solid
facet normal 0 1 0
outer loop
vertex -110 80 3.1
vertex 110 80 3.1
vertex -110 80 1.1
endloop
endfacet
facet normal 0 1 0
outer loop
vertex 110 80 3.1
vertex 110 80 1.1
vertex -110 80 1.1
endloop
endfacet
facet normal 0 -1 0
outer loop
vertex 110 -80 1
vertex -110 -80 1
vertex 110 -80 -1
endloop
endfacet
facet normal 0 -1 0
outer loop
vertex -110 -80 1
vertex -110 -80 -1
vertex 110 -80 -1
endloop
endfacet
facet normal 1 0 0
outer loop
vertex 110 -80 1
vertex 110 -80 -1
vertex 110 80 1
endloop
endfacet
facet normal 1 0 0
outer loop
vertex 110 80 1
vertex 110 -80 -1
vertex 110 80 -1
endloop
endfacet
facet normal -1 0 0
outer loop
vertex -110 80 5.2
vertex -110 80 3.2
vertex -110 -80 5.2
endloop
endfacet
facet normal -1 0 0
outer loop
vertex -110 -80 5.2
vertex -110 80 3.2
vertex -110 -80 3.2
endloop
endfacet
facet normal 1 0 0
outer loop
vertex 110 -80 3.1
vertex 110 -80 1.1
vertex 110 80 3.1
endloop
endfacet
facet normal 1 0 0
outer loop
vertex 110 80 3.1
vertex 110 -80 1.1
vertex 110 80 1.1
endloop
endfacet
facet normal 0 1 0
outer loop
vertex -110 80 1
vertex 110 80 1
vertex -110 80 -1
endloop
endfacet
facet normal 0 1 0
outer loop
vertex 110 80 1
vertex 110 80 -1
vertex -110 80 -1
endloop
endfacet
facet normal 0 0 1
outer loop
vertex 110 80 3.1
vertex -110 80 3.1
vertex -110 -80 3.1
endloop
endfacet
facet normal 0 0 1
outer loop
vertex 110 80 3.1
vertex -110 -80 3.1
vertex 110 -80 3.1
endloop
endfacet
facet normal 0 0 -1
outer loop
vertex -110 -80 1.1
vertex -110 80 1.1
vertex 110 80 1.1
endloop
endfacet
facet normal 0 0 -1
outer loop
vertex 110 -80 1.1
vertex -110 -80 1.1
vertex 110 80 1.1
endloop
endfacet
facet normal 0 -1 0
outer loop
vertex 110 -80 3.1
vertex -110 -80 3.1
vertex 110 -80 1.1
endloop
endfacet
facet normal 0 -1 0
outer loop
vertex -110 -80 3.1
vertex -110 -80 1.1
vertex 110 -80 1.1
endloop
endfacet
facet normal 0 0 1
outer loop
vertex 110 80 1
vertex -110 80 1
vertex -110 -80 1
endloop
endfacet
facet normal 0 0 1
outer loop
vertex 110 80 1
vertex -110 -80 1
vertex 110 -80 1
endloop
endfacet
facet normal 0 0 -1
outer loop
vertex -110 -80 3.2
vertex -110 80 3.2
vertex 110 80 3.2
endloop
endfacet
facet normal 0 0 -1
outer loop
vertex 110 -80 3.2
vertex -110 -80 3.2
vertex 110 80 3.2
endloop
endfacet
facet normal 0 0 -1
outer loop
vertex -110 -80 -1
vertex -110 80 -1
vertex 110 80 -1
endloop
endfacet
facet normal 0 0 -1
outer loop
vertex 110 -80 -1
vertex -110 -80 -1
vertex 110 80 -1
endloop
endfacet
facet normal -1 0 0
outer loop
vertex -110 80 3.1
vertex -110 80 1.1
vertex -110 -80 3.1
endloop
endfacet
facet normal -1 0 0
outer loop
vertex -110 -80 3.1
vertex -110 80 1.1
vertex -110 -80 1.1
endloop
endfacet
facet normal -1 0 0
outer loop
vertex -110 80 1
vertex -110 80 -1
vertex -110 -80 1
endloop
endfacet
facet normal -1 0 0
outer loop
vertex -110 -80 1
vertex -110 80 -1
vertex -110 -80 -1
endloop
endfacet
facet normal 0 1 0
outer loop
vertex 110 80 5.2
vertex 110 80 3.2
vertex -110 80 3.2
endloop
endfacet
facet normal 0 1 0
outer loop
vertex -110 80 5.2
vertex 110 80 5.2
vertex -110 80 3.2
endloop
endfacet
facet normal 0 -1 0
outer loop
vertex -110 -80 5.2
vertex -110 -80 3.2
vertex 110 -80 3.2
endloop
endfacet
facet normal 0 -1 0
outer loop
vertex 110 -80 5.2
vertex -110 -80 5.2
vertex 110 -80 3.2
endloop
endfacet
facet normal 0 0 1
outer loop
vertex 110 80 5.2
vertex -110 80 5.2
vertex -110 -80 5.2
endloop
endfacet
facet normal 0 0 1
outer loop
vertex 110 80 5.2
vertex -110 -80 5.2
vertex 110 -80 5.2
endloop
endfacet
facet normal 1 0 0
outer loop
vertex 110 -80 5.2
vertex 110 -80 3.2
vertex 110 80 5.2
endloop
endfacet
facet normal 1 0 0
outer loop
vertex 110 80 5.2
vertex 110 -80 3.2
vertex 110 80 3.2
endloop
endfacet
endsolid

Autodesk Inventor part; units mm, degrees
ref_plane "YZ Plane" through (0, 0, 0) normal (1, 0, 0) x (0, 1, 0)
ref_plane "XZ Plane" through (0, 0, 0) normal (0, 1, 0) x (-1, 0, 0)
ref_plane "XY Plane" through (0, 0, 0) normal (0, 0, 1) x (1, 0, 0)
sketch "Sketch1" plane through (0, 0, 0) normal (0, 0, 1) x (1, 0, 0)
  line L0 (-110, -80) -> (110, -80)
  line L1 (110, -80) -> (110, 80)
  line L2 (110, 80) -> (-110, 80)
  line L3 (-110, 80) -> (-110, -80)
  line L4 (-110, -80) -> (110, 80) construction
  line L5 (110, -80) -> (-110, 80) construction
  point P0 (0, 0)
  dimension "d0" = 220
  dimension "d1" = 160
extrude "Extrusion1" add sketch "Sketch1" along normal mid plane 2
pattern_linear "Rectangular Pattern1" count 3 spacing 2.1 along (0, 0, 1) of "Extrusion1"
properties part number "Game_TurmoilCard"
